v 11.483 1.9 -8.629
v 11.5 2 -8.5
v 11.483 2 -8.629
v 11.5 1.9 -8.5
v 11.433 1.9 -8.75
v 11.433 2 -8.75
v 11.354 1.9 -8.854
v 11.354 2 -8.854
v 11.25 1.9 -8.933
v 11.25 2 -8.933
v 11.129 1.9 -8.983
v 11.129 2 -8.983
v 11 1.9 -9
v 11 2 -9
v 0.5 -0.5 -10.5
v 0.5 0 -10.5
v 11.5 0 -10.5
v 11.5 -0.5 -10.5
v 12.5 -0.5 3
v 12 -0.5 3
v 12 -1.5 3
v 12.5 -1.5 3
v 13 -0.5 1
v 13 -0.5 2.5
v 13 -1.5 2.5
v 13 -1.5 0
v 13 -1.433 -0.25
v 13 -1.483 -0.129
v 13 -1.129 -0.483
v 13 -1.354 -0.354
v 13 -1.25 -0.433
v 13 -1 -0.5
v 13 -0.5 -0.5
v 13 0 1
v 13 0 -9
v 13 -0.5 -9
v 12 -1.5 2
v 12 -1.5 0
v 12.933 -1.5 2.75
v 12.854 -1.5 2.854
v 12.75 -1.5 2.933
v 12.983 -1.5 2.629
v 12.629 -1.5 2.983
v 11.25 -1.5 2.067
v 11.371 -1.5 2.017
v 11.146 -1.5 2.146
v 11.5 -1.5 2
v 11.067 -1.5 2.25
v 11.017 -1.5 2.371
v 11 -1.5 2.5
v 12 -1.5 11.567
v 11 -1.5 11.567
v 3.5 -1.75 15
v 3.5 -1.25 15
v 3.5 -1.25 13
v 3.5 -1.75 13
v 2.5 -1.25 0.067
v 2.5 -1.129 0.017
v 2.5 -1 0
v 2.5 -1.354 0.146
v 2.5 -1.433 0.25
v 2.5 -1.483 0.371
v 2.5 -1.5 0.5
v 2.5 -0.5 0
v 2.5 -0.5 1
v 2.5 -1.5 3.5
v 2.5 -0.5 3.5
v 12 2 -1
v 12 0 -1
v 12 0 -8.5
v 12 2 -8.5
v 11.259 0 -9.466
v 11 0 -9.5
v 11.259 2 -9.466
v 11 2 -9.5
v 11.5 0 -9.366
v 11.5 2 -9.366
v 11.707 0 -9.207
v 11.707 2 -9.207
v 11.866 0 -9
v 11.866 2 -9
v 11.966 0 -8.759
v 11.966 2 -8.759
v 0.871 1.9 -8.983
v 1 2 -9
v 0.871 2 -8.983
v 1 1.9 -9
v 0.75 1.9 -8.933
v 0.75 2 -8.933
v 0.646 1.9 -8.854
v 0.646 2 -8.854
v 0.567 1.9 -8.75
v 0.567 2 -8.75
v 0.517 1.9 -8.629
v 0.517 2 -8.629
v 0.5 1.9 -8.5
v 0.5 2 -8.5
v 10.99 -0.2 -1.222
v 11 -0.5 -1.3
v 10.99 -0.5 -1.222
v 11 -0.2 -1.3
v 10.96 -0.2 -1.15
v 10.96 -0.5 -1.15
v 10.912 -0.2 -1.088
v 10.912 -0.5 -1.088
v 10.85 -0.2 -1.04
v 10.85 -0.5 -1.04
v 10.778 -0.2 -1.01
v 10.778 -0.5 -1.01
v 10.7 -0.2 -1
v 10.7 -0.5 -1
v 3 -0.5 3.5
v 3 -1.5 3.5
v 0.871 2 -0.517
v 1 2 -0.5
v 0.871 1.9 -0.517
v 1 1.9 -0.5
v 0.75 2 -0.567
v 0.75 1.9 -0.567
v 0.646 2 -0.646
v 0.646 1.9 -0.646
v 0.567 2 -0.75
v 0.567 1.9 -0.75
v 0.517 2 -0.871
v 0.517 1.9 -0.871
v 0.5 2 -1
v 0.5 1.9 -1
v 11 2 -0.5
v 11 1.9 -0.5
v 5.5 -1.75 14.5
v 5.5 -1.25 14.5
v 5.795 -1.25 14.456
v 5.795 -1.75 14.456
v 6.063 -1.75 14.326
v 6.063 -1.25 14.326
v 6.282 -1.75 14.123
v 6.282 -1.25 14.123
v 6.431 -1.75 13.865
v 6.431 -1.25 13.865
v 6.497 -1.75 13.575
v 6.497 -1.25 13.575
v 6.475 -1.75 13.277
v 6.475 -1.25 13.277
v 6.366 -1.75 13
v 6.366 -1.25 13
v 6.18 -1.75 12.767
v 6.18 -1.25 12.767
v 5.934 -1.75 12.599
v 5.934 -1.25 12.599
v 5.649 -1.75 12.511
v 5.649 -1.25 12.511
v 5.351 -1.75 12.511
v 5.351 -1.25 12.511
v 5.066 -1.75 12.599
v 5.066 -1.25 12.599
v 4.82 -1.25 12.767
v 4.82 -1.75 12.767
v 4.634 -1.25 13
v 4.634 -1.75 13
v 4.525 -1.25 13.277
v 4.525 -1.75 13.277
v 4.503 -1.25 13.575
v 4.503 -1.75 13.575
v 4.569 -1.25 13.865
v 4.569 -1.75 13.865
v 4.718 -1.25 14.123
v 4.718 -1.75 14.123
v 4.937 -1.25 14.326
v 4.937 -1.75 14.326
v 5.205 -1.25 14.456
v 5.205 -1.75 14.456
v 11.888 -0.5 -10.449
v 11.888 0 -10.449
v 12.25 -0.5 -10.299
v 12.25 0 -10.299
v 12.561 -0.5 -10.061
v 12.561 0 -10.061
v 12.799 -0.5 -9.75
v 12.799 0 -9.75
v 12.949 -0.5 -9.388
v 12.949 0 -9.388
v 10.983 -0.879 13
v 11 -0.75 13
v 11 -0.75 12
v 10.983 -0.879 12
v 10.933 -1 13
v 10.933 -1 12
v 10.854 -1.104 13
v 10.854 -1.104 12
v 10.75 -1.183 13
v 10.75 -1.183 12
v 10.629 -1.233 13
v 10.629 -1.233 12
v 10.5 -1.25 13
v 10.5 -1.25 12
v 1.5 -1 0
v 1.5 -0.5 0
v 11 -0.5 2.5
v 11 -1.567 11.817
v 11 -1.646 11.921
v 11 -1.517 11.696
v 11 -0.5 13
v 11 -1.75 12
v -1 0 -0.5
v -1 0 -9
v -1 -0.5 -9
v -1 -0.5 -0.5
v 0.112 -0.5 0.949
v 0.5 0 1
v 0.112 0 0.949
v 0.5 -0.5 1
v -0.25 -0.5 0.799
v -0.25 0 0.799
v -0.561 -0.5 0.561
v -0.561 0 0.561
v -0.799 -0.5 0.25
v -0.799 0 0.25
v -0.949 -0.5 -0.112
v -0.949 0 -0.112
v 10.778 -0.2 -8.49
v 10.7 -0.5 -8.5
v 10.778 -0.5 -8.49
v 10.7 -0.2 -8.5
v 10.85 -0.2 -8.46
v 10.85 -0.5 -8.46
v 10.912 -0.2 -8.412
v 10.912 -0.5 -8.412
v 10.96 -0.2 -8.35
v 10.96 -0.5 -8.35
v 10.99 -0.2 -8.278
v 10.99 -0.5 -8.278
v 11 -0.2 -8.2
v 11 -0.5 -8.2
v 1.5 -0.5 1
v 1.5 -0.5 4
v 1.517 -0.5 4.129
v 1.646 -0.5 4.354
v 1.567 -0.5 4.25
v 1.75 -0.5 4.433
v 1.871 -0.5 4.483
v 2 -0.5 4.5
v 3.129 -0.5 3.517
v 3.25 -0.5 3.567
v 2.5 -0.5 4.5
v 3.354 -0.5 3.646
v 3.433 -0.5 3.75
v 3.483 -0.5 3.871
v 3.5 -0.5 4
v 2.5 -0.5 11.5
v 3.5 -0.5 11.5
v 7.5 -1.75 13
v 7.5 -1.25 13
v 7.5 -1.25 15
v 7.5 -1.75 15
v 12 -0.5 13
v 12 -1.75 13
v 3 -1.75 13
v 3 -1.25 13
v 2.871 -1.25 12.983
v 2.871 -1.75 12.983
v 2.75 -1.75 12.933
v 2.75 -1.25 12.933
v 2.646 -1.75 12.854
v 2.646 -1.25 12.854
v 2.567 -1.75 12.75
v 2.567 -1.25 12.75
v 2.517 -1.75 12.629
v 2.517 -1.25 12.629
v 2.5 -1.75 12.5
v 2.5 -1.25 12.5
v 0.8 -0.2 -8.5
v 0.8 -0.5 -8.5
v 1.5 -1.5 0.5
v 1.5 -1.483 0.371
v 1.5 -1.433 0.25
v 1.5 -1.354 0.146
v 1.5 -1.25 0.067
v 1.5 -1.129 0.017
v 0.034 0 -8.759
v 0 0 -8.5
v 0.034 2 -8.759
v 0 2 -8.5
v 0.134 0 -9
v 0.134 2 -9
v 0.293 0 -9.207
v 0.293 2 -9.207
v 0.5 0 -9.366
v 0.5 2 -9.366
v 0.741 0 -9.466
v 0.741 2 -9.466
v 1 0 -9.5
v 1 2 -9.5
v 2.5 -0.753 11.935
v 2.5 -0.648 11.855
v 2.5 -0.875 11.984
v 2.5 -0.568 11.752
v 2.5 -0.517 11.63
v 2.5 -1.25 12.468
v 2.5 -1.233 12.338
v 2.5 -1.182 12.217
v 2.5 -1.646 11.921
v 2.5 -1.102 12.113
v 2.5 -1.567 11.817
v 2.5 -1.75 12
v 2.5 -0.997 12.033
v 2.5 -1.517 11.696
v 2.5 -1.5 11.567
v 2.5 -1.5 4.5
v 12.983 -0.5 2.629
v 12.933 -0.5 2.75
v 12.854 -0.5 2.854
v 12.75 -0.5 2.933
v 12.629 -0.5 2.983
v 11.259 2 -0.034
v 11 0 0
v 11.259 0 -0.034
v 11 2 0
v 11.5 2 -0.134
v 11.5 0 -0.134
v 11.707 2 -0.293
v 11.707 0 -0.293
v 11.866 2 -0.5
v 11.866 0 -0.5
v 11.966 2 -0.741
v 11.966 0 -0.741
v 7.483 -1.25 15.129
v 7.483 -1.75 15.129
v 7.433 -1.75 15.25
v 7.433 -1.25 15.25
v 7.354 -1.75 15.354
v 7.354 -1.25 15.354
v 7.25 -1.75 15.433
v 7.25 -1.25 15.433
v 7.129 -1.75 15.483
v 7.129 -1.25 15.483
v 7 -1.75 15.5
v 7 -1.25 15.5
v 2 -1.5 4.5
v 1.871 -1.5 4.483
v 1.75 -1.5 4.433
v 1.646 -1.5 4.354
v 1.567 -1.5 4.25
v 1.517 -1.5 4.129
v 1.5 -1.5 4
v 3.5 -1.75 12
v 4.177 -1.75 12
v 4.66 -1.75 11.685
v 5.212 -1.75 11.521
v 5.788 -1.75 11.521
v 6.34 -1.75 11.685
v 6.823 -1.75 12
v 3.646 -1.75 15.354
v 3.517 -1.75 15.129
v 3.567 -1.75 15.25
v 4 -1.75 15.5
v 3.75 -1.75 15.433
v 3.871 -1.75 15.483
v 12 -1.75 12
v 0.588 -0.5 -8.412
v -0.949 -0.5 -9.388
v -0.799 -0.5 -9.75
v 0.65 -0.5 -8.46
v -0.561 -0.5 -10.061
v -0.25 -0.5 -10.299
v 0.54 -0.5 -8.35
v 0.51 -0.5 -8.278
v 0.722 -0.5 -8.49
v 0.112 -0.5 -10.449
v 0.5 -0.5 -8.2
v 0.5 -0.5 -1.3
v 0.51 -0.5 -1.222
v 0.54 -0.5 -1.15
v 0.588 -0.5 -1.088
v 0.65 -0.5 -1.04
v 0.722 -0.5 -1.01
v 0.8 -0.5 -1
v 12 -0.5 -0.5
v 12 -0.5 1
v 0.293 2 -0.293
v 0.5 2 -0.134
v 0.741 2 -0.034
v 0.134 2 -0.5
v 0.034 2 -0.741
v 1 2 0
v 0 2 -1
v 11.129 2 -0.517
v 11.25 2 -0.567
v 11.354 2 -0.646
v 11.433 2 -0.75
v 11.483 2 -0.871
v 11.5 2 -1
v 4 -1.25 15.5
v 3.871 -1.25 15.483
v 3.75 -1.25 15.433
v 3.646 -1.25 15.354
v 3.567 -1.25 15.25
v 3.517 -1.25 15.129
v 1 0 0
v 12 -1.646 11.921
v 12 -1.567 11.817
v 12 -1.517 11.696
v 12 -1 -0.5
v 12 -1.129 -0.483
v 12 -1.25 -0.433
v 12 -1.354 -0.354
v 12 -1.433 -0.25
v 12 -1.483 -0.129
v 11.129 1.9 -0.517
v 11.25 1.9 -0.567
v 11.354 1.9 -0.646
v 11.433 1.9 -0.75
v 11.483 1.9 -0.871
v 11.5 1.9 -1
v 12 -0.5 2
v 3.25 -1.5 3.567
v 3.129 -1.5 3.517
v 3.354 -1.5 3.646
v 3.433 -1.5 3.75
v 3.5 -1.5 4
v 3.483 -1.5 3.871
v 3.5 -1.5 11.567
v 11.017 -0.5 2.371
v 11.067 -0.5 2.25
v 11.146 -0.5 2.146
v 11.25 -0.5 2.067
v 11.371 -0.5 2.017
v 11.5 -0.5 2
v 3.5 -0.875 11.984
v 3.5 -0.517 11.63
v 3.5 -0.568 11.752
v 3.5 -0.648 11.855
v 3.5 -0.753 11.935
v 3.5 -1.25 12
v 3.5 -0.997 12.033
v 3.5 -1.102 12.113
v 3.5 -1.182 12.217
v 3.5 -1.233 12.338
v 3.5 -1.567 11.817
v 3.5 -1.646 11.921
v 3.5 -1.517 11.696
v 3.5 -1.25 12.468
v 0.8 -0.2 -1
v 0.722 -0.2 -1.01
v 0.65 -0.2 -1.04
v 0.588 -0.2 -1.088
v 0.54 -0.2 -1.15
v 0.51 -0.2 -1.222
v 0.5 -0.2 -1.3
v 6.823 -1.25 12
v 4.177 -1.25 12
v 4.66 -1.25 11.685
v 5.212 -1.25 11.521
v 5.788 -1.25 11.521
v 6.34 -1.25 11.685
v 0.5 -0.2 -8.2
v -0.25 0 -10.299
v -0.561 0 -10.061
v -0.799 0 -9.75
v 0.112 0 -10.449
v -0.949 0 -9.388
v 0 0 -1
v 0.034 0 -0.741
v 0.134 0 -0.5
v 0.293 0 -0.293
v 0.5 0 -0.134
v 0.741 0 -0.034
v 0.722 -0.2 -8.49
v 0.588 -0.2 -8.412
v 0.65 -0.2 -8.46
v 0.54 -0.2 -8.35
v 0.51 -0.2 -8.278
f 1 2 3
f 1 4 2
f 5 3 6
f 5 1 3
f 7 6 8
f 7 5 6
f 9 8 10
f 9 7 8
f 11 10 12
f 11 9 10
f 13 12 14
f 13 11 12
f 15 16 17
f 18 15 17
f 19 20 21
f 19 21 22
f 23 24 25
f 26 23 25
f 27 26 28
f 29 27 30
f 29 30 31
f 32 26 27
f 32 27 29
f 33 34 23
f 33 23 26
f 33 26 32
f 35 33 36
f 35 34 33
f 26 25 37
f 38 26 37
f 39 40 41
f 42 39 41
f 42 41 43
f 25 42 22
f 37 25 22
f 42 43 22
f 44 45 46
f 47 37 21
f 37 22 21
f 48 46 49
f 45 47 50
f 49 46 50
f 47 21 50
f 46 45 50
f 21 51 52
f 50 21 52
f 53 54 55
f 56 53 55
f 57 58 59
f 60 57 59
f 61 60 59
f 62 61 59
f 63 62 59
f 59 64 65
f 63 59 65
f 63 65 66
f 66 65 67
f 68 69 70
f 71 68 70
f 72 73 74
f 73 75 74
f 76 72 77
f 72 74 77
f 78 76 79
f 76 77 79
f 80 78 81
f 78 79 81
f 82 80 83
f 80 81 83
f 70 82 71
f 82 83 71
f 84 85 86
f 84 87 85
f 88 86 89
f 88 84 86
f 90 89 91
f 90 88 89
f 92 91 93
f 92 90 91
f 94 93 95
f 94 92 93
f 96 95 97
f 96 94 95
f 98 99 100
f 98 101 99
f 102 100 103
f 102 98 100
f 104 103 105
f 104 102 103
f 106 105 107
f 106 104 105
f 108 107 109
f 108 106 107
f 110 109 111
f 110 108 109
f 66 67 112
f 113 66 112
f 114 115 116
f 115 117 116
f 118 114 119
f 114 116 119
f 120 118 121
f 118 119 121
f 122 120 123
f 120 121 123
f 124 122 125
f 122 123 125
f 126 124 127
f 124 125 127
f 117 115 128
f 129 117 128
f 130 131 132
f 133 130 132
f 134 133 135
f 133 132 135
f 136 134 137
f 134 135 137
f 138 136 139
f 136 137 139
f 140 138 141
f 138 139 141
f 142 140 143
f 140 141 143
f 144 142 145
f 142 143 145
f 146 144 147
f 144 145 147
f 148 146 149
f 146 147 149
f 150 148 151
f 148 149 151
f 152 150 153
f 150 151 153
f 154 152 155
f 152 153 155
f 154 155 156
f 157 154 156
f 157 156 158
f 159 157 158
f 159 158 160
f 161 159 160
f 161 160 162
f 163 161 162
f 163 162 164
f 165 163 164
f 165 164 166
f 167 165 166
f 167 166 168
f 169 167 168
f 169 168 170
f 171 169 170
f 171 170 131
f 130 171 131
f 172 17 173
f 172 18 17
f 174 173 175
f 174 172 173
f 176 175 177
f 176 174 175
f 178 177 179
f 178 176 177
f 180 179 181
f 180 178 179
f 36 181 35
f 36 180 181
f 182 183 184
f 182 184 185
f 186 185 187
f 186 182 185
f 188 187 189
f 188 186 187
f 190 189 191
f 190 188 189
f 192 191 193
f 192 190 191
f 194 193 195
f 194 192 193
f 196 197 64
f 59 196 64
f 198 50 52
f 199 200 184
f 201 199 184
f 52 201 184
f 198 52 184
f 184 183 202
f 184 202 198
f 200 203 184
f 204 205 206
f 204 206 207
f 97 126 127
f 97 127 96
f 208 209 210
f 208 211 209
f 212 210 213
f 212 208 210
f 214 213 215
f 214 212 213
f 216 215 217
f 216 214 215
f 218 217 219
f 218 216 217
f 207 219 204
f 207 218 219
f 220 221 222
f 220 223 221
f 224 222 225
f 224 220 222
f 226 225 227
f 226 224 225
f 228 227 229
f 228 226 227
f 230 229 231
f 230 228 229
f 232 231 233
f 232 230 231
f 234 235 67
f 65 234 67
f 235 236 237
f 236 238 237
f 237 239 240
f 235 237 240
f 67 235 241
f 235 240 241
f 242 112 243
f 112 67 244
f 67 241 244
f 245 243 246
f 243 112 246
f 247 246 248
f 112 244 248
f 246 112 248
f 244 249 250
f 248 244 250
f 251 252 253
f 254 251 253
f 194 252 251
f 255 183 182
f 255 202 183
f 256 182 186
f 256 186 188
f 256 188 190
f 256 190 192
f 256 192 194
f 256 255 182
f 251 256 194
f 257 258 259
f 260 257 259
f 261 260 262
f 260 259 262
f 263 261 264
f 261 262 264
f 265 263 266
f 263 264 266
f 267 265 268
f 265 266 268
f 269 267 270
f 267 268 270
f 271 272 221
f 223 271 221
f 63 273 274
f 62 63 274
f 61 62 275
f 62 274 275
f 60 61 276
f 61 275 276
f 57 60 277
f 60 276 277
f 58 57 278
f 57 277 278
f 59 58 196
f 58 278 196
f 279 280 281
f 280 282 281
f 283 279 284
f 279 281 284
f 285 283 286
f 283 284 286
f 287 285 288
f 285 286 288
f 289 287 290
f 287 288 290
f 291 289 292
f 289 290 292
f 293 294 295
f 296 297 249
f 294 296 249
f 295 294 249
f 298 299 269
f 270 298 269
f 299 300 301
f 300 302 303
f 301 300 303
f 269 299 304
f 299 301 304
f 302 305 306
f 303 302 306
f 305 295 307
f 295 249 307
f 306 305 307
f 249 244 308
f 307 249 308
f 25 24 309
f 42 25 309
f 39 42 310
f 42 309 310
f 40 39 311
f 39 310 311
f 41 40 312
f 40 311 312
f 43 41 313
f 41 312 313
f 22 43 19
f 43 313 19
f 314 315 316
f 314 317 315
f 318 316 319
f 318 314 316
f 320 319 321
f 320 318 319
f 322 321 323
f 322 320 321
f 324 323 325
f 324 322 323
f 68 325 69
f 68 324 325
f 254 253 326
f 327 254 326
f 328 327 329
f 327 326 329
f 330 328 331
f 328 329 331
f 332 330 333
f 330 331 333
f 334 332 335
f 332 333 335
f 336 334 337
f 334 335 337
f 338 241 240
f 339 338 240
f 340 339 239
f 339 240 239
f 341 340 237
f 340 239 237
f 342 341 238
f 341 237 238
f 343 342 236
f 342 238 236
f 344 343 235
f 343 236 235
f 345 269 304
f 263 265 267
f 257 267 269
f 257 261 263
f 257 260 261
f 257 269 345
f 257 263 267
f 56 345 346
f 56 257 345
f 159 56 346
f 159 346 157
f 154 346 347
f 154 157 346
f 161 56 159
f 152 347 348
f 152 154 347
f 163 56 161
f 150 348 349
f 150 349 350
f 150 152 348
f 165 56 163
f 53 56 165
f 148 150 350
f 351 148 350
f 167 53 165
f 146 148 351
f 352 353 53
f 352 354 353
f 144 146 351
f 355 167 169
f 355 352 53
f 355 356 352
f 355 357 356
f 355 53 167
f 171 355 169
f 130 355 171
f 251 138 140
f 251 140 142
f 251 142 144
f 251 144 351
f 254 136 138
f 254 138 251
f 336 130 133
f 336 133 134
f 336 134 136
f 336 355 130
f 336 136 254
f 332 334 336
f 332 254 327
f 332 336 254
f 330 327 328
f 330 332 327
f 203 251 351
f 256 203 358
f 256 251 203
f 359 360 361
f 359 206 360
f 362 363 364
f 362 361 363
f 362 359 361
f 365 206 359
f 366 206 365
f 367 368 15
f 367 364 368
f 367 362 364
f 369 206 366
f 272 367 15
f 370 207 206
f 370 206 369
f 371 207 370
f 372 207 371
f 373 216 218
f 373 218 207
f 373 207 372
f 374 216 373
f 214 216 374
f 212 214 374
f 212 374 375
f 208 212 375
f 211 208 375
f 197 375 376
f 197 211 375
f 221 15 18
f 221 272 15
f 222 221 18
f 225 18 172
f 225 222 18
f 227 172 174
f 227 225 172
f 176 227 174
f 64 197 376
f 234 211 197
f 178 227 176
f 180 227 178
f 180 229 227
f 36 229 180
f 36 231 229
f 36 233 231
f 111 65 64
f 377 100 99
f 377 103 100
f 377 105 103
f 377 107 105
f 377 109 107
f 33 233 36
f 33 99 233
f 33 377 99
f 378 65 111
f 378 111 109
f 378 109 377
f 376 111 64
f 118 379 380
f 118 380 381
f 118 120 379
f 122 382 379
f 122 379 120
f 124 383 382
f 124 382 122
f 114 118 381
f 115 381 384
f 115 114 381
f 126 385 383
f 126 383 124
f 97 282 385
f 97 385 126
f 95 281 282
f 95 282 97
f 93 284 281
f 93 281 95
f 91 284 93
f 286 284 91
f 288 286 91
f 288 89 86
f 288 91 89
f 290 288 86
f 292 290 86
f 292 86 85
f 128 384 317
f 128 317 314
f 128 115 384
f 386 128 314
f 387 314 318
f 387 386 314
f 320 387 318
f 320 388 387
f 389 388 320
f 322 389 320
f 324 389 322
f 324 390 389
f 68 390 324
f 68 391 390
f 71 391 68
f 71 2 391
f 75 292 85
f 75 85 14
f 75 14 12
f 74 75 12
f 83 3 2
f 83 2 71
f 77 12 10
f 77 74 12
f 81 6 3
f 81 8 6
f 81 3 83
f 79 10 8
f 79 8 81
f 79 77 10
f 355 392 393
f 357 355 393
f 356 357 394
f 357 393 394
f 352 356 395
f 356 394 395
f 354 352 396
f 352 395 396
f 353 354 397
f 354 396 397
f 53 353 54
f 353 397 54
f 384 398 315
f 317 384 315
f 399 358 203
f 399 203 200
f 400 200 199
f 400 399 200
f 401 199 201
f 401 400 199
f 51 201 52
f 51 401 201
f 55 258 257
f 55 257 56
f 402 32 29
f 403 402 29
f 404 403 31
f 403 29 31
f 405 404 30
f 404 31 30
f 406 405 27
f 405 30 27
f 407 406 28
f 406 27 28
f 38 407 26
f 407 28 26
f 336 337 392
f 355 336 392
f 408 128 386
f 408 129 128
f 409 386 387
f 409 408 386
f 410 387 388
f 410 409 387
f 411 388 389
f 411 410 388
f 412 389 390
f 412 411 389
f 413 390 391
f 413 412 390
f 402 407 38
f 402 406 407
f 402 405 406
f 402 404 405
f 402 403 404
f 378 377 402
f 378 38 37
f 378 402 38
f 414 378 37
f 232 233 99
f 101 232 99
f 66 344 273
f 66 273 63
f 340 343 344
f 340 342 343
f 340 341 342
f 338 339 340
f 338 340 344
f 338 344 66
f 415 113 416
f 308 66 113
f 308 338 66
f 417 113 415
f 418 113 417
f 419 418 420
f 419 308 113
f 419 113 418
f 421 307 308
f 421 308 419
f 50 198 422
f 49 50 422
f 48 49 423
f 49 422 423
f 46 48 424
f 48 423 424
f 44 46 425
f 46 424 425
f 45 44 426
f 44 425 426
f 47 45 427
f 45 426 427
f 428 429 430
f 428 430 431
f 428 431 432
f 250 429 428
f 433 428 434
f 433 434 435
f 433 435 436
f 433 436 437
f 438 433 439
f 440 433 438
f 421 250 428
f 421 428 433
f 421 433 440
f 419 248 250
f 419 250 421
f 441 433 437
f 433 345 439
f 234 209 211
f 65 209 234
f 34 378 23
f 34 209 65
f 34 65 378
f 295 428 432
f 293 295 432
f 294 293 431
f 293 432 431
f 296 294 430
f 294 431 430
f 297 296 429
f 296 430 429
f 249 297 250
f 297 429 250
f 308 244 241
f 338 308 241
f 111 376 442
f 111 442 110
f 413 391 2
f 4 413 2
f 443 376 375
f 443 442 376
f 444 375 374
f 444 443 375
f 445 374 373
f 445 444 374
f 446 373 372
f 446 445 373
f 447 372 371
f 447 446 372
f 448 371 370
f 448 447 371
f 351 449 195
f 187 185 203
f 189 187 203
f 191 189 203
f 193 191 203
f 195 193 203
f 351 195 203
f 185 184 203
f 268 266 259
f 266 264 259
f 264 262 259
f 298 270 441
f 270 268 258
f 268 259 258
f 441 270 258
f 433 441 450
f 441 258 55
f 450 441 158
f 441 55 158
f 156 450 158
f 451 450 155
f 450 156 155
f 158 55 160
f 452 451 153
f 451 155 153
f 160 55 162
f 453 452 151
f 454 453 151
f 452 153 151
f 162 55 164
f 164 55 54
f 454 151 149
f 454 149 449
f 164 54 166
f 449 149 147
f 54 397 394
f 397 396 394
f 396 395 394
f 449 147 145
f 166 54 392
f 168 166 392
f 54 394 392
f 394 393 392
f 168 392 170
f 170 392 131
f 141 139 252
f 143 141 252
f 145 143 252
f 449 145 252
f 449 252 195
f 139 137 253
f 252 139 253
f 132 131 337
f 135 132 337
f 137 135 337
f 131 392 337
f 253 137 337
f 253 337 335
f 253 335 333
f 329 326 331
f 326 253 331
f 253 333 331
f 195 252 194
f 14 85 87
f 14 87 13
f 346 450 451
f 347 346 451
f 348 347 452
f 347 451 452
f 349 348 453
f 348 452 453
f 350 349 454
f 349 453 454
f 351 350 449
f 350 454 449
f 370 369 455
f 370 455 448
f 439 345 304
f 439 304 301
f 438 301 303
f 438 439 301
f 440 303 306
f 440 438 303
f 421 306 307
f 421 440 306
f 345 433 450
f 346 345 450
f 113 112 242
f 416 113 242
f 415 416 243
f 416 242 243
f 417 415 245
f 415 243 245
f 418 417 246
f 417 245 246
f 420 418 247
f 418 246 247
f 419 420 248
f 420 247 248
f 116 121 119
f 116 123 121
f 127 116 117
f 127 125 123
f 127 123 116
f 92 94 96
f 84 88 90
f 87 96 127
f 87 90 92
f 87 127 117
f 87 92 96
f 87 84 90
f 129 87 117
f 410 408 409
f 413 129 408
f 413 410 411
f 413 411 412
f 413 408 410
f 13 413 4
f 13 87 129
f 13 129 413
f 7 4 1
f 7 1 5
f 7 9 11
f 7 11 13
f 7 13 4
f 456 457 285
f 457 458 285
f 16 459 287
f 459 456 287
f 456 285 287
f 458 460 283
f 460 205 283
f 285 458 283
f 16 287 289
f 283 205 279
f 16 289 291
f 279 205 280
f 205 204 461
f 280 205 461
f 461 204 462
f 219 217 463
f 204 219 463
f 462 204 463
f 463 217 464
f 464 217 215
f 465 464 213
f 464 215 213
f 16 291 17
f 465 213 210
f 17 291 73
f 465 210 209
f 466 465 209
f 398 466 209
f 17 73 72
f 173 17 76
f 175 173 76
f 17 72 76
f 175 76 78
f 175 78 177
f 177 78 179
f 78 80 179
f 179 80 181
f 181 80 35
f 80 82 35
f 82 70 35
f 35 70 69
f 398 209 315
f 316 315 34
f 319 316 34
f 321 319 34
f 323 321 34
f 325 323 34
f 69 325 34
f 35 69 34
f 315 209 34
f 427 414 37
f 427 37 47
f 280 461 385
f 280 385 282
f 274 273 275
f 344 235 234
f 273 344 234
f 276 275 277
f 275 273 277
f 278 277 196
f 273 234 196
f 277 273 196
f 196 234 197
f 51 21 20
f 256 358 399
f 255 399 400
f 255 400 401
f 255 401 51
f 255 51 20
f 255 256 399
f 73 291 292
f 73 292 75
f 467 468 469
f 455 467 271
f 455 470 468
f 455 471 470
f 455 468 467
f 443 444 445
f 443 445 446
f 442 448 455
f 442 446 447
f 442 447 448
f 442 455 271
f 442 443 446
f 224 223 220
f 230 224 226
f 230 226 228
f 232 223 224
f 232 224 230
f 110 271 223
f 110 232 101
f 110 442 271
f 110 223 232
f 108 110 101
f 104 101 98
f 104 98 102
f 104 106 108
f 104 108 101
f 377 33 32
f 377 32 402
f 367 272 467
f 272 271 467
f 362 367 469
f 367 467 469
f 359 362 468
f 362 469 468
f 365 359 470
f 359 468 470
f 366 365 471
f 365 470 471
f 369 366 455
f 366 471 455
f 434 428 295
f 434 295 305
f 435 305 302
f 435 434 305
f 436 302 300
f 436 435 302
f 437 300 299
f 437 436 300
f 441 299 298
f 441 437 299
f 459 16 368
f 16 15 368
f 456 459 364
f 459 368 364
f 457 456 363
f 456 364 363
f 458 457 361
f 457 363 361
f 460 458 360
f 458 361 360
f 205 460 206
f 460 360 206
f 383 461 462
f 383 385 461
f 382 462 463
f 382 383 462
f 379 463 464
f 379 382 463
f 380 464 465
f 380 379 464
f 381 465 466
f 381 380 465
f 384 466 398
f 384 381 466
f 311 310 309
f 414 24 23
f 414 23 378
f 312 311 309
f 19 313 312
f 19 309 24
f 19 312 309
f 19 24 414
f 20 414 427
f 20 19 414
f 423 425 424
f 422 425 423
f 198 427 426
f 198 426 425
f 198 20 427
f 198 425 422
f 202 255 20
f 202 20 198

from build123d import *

# Parameters (mm, degrees)
SKETCH1_W                = 12
SKETCH1_H                = 9.5
BOSS_EXTRUDE1_DEPTH      = 2
SKETCH2_W                = 11
SKETCH2_H                = 8.5
CUT_EXTRUDE1_DEPTH       = 0.1
FILLET1_R                = 0.5
FILLET2_R                = 1
SKETCH3_W                = 14
SKETCH3_H                = 11.5
BOSS_EXTRUDE2_DEPTH      = 0.5
BOSS_EXTRUDE5_DEPTH      = 1
BOSS_EXTRUDE6_DEPTH      = 0.25
BOSS_EXTRUDE6_DEPTH_BACK = 0.25
SKETCH7_W                = 9.5
SKETCH7_H                = 1
BOSS_EXTRUDE7_DEPTH      = 0.5
CUT_EXTRUDE2_REACH       = 22.489
SKETCH10_R               = 1
FILLET4_R                = 0.5
FILLET5_R                = 0.5
FILLET6_R                = 1.5
SKETCH11_W               = 10.5
SKETCH11_H               = 7.5
CUT_EXTRUDE3_DEPTH       = 0.3
FILLET7_R                = 0.3


with BuildPart() as part:
    # Sketch1 → Boss-Extrude1 (new body)
    with BuildSketch(Plane(origin=(0, 0, 0), x_dir=(1, 0, 0), z_dir=(0, 1, 0))):
        with Locations((6, 4.75)):
            Rectangle(SKETCH1_W, SKETCH1_H)
    extrude(amount=BOSS_EXTRUDE1_DEPTH)

    # Sketch2 → Cut-Extrude1 (cut)
    with BuildSketch(Plane(origin=(0, 2, 0), x_dir=(1, 0, 0), z_dir=(0, 1, 0))):
        with Locations((6, 4.75)):
            Rectangle(SKETCH2_W, SKETCH2_H)
    extrude(amount=-CUT_EXTRUDE1_DEPTH, mode=Mode.SUBTRACT)

    # Fillet1
    fillet1_edges = [part.edges().sort_by_distance(p)[0] for p in [
        (0.5, 1.95, -0.5),
        (0.5, 1.95, -9),
        (11.5, 1.95, -9),
        (11.5, 1.95, -0.5),
    ]]
    fillet(fillet1_edges, radius=FILLET1_R)

    # Fillet2
    fillet2_edges = [part.edges().sort_by_distance(p)[0] for p in [
        (0, 1, -9.5),
        (12, 1, -9.5),
        (12, 1, 0),
        (0, 1, 0),
    ]]
    fillet(fillet2_edges, radius=FILLET2_R)

    # Sketch3 → Boss-Extrude2 (add)
    with BuildSketch(Plane.XZ):
        with Locations((6, -4.75)):
            Rectangle(SKETCH3_W, SKETCH3_H)
    extrude(amount=BOSS_EXTRUDE2_DEPTH)

    # Sketch6 → Boss-Extrude5 (add)
    with BuildSketch(Plane.XZ.offset(0.5)):
        Polygon((13, -0.5), (12, -0.5), (12, 2), (11, 2), (11, 13), (12, 13), (12, 3), (13, 3), align=None)
        Polygon((3.5, 12), (2.5, 12), (2.5, 4.5), (1.5, 4.5), (1.5, 0), (2.5, 0), (2.5, 3.5), (3.5, 3.5), align=None)
    extrude(amount=BOSS_EXTRUDE5_DEPTH)

    # Sketch7 → Boss-Extrude6 (add, two sides: drawn at the far end of the back side and taken through both)
    with BuildSketch(Plane.XZ.offset(1.5).offset(-BOSS_EXTRUDE6_DEPTH_BACK)):
        with Locations((7.25, 12.5)):
            Rectangle(SKETCH7_W, SKETCH7_H)
    extrude(amount=BOSS_EXTRUDE6_DEPTH + BOSS_EXTRUDE6_DEPTH_BACK)

    # Sketch9 → Boss-Extrude7 (add)
    with BuildSketch(Plane(origin=(0, -1.25, 0), x_dir=(1, 0, 0), z_dir=(0, 1, 0))):
        with BuildLine():
            Line((6.822875656, -12), (7.5, -12))
            Line((7.5, -12), (7.5, -15.5))
            Line((7.5, -15.5), (3.5, -15.5))
            Line((3.5, -15.5), (3.5, -12))
            Line((3.5, -12), (4.177124344, -12))
            ThreePointArc((4.177124344, -12), (5.5, -11.5), (6.822875656, -12))
        make_face()
    extrude(amount=-BOSS_EXTRUDE7_DEPTH)

    # Sketch10 → Cut-Extrude2 (cut, up to next)
    with BuildSketch(Plane(origin=(0, -1.25, 0), x_dir=(1, 0, 0), z_dir=(0, 1, 0)), mode=Mode.PRIVATE) as cut_extrude2_sk1:
        with Locations(Location((5.5, -13.5, 0), (0, 0, 270))):
            Circle(SKETCH10_R)
    cut_extrude2_tool1 = extrude(cut_extrude2_sk1.sketch, amount=-CUT_EXTRUDE2_REACH, mode=Mode.PRIVATE) & part.part
    add(cut_extrude2_tool1.solids().sort_by_distance((5.5, -1.25, 13.5))[0], mode=Mode.SUBTRACT)

    # Fillet4
    # the kernel refuses this fillet: 0.5 mm, written as the material it adds along each edge
    with BuildSketch(Plane(origin=(11, -1.25, 13), x_dir=(0, 1, 0), z_dir=(0, 0, -1))) as fillet4_piece_1:
        with BuildLine():
            CenterArc((FILLET4_R, -FILLET4_R), FILLET4_R, 90, 90)
            Line((0, -FILLET4_R), (0, 0))
            Line((0, 0), (FILLET4_R, 0))
        make_face()
    extrude(amount=1)
    with BuildSketch(Plane(origin=(3.5, -1.5, 12), x_dir=(0, 0, -1), z_dir=(-1, 0, 0))) as fillet4_piece_2:
        with BuildLine():
            CenterArc((0.433012702, 0.5), FILLET4_R, 210, 60)
            Line((0, 0.25), (0, 0))
            Line((0, 0), (0.433012702, 0))
        make_face()
    extrude(amount=1)
    # the kernel refuses this fillet: 0.5 mm, written as the material it takes off along each edge
    with BuildSketch(Plane(origin=(13, 0.75, 3), x_dir=(-1, 0, 0), z_dir=(0, -1, 0)), Plane(origin=(11, 0.75, 2), x_dir=(1, 0, 0), z_dir=(0, -1, 0)), Plane(origin=(14.25, -1.5, -0.5), x_dir=(0, 0, 1), z_dir=(-1, 0, 0)), Plane(origin=(3.5, 0.75, 3.5), x_dir=(0, 0, 1), z_dir=(0, -1, 0))) as fillet4_2_piece_1:
        with BuildLine():
            CenterArc((FILLET4_R, FILLET4_R), FILLET4_R, 180, 90)
            Line((0, FILLET4_R), (0, 0))
            Line((0, 0), (FILLET4_R, 0))
        make_face()
    extrude(amount=3.5, mode=Mode.SUBTRACT)
    with BuildSketch(Plane(origin=(4.75, -0.5, 12), x_dir=(0, -1, 0), z_dir=(-1, 0, 0)), Plane(origin=(1.5, 0.75, 4.5), x_dir=(1, 0, 0), z_dir=(0, -1, 0)), Plane(origin=(0.25, -1.5, 0), x_dir=(0, 0, 1), z_dir=(1, 0, 0))) as fillet4_2_piece_2:
        with BuildLine():
            CenterArc((FILLET4_R, -FILLET4_R), FILLET4_R, 90, 90)
            Line((0, -FILLET4_R), (0, 0))
            Line((0, 0), (FILLET4_R, 0))
        make_face()
    extrude(amount=3.5, mode=Mode.SUBTRACT)
    with BuildSketch(Plane(origin=(2.5, 0, 13), x_dir=(0, 0, -1), z_dir=(0, -1, 0)), Plane(origin=(3.5, 0, 15.5), x_dir=(0, 0, -1), z_dir=(0, -1, 0)), Plane(origin=(7.5, 0, 15.5), x_dir=(-1, 0, 0), z_dir=(0, -1, 0))) as fillet4_2_piece_3:
        with BuildLine():
            CenterArc((FILLET4_R, FILLET4_R), FILLET4_R, 180, 90)
            Line((0, FILLET4_R), (0, 0))
            Line((0, 0), (FILLET4_R, 0))
        make_face()
    extrude(amount=3, mode=Mode.SUBTRACT)

    # Fillet5
    # the kernel refuses this fillet: 0.5 mm, written as the material it adds along each edge
    with BuildSketch(Plane(origin=(3.5, -1.25, 12), x_dir=(0, 0.9991049126334705, -0.04230098759681056), z_dir=(-1, 0, 0))) as fillet5_piece_1:
        with BuildLine():
            CenterArc((0.479745195, -0.488977209), FILLET5_R, 102.053120737, 75.522487814)
            Line((-0.019807261, -0.467826716), (-0.069762507, -0.465711666))
            Line((-0.069762507, -0.465711666), (-0.049955246, 0.002115049))
            Line((-0.049955246, 0.002115049), (0.002115049, 0.049955246))
            ThreePointArc((0.002115049, 0.049955246), (0.251891278, 0.039379999), (0.364895035, 0.048897721))
            Line((0.364895035, 0.048897721), (0.375335958, 0))
        make_face()
    extrude(amount=1)
    with BuildSketch(Plane(origin=(12, -1.5, 12), x_dir=(0, -1, 0), z_dir=(-1, 0, 0))) as fillet5_piece_2:
        with BuildLine():
            CenterArc((0.5, -0.433012702), FILLET5_R, 120, 60)
            Line((0, -0.433012702), (0, 0))
            Line((0, 0), (0.25, 0))
        make_face()
    extrude(amount=1)

    # Fillet6
    fillet6_edges = [part.edges().sort_by_distance(p)[0] for p in [
        (-1, -0.25, 1),
        (-1, -0.25, -10.5),
        (13, -0.25, -10.5),
    ]]
    fillet(fillet6_edges, radius=FILLET6_R)

    # Sketch11 → Cut-Extrude3 (cut)
    with BuildSketch(Plane.XZ.offset(0.5)):
        with Locations((5.75, -4.75)):
            Rectangle(SKETCH11_W, SKETCH11_H)
    extrude(amount=-CUT_EXTRUDE3_DEPTH, mode=Mode.SUBTRACT)

    # Fillet7
    fillet7_edges = [part.edges().sort_by_distance(p)[0] for p in [
        (0.5, -0.35, -8.5),
        (0.5, -0.35, -1),
        (11, -0.35, -1),
        (11, -0.35, -8.5),
    ]]
    fillet(fillet7_edges, radius=FILLET7_R)


solid = part.part
